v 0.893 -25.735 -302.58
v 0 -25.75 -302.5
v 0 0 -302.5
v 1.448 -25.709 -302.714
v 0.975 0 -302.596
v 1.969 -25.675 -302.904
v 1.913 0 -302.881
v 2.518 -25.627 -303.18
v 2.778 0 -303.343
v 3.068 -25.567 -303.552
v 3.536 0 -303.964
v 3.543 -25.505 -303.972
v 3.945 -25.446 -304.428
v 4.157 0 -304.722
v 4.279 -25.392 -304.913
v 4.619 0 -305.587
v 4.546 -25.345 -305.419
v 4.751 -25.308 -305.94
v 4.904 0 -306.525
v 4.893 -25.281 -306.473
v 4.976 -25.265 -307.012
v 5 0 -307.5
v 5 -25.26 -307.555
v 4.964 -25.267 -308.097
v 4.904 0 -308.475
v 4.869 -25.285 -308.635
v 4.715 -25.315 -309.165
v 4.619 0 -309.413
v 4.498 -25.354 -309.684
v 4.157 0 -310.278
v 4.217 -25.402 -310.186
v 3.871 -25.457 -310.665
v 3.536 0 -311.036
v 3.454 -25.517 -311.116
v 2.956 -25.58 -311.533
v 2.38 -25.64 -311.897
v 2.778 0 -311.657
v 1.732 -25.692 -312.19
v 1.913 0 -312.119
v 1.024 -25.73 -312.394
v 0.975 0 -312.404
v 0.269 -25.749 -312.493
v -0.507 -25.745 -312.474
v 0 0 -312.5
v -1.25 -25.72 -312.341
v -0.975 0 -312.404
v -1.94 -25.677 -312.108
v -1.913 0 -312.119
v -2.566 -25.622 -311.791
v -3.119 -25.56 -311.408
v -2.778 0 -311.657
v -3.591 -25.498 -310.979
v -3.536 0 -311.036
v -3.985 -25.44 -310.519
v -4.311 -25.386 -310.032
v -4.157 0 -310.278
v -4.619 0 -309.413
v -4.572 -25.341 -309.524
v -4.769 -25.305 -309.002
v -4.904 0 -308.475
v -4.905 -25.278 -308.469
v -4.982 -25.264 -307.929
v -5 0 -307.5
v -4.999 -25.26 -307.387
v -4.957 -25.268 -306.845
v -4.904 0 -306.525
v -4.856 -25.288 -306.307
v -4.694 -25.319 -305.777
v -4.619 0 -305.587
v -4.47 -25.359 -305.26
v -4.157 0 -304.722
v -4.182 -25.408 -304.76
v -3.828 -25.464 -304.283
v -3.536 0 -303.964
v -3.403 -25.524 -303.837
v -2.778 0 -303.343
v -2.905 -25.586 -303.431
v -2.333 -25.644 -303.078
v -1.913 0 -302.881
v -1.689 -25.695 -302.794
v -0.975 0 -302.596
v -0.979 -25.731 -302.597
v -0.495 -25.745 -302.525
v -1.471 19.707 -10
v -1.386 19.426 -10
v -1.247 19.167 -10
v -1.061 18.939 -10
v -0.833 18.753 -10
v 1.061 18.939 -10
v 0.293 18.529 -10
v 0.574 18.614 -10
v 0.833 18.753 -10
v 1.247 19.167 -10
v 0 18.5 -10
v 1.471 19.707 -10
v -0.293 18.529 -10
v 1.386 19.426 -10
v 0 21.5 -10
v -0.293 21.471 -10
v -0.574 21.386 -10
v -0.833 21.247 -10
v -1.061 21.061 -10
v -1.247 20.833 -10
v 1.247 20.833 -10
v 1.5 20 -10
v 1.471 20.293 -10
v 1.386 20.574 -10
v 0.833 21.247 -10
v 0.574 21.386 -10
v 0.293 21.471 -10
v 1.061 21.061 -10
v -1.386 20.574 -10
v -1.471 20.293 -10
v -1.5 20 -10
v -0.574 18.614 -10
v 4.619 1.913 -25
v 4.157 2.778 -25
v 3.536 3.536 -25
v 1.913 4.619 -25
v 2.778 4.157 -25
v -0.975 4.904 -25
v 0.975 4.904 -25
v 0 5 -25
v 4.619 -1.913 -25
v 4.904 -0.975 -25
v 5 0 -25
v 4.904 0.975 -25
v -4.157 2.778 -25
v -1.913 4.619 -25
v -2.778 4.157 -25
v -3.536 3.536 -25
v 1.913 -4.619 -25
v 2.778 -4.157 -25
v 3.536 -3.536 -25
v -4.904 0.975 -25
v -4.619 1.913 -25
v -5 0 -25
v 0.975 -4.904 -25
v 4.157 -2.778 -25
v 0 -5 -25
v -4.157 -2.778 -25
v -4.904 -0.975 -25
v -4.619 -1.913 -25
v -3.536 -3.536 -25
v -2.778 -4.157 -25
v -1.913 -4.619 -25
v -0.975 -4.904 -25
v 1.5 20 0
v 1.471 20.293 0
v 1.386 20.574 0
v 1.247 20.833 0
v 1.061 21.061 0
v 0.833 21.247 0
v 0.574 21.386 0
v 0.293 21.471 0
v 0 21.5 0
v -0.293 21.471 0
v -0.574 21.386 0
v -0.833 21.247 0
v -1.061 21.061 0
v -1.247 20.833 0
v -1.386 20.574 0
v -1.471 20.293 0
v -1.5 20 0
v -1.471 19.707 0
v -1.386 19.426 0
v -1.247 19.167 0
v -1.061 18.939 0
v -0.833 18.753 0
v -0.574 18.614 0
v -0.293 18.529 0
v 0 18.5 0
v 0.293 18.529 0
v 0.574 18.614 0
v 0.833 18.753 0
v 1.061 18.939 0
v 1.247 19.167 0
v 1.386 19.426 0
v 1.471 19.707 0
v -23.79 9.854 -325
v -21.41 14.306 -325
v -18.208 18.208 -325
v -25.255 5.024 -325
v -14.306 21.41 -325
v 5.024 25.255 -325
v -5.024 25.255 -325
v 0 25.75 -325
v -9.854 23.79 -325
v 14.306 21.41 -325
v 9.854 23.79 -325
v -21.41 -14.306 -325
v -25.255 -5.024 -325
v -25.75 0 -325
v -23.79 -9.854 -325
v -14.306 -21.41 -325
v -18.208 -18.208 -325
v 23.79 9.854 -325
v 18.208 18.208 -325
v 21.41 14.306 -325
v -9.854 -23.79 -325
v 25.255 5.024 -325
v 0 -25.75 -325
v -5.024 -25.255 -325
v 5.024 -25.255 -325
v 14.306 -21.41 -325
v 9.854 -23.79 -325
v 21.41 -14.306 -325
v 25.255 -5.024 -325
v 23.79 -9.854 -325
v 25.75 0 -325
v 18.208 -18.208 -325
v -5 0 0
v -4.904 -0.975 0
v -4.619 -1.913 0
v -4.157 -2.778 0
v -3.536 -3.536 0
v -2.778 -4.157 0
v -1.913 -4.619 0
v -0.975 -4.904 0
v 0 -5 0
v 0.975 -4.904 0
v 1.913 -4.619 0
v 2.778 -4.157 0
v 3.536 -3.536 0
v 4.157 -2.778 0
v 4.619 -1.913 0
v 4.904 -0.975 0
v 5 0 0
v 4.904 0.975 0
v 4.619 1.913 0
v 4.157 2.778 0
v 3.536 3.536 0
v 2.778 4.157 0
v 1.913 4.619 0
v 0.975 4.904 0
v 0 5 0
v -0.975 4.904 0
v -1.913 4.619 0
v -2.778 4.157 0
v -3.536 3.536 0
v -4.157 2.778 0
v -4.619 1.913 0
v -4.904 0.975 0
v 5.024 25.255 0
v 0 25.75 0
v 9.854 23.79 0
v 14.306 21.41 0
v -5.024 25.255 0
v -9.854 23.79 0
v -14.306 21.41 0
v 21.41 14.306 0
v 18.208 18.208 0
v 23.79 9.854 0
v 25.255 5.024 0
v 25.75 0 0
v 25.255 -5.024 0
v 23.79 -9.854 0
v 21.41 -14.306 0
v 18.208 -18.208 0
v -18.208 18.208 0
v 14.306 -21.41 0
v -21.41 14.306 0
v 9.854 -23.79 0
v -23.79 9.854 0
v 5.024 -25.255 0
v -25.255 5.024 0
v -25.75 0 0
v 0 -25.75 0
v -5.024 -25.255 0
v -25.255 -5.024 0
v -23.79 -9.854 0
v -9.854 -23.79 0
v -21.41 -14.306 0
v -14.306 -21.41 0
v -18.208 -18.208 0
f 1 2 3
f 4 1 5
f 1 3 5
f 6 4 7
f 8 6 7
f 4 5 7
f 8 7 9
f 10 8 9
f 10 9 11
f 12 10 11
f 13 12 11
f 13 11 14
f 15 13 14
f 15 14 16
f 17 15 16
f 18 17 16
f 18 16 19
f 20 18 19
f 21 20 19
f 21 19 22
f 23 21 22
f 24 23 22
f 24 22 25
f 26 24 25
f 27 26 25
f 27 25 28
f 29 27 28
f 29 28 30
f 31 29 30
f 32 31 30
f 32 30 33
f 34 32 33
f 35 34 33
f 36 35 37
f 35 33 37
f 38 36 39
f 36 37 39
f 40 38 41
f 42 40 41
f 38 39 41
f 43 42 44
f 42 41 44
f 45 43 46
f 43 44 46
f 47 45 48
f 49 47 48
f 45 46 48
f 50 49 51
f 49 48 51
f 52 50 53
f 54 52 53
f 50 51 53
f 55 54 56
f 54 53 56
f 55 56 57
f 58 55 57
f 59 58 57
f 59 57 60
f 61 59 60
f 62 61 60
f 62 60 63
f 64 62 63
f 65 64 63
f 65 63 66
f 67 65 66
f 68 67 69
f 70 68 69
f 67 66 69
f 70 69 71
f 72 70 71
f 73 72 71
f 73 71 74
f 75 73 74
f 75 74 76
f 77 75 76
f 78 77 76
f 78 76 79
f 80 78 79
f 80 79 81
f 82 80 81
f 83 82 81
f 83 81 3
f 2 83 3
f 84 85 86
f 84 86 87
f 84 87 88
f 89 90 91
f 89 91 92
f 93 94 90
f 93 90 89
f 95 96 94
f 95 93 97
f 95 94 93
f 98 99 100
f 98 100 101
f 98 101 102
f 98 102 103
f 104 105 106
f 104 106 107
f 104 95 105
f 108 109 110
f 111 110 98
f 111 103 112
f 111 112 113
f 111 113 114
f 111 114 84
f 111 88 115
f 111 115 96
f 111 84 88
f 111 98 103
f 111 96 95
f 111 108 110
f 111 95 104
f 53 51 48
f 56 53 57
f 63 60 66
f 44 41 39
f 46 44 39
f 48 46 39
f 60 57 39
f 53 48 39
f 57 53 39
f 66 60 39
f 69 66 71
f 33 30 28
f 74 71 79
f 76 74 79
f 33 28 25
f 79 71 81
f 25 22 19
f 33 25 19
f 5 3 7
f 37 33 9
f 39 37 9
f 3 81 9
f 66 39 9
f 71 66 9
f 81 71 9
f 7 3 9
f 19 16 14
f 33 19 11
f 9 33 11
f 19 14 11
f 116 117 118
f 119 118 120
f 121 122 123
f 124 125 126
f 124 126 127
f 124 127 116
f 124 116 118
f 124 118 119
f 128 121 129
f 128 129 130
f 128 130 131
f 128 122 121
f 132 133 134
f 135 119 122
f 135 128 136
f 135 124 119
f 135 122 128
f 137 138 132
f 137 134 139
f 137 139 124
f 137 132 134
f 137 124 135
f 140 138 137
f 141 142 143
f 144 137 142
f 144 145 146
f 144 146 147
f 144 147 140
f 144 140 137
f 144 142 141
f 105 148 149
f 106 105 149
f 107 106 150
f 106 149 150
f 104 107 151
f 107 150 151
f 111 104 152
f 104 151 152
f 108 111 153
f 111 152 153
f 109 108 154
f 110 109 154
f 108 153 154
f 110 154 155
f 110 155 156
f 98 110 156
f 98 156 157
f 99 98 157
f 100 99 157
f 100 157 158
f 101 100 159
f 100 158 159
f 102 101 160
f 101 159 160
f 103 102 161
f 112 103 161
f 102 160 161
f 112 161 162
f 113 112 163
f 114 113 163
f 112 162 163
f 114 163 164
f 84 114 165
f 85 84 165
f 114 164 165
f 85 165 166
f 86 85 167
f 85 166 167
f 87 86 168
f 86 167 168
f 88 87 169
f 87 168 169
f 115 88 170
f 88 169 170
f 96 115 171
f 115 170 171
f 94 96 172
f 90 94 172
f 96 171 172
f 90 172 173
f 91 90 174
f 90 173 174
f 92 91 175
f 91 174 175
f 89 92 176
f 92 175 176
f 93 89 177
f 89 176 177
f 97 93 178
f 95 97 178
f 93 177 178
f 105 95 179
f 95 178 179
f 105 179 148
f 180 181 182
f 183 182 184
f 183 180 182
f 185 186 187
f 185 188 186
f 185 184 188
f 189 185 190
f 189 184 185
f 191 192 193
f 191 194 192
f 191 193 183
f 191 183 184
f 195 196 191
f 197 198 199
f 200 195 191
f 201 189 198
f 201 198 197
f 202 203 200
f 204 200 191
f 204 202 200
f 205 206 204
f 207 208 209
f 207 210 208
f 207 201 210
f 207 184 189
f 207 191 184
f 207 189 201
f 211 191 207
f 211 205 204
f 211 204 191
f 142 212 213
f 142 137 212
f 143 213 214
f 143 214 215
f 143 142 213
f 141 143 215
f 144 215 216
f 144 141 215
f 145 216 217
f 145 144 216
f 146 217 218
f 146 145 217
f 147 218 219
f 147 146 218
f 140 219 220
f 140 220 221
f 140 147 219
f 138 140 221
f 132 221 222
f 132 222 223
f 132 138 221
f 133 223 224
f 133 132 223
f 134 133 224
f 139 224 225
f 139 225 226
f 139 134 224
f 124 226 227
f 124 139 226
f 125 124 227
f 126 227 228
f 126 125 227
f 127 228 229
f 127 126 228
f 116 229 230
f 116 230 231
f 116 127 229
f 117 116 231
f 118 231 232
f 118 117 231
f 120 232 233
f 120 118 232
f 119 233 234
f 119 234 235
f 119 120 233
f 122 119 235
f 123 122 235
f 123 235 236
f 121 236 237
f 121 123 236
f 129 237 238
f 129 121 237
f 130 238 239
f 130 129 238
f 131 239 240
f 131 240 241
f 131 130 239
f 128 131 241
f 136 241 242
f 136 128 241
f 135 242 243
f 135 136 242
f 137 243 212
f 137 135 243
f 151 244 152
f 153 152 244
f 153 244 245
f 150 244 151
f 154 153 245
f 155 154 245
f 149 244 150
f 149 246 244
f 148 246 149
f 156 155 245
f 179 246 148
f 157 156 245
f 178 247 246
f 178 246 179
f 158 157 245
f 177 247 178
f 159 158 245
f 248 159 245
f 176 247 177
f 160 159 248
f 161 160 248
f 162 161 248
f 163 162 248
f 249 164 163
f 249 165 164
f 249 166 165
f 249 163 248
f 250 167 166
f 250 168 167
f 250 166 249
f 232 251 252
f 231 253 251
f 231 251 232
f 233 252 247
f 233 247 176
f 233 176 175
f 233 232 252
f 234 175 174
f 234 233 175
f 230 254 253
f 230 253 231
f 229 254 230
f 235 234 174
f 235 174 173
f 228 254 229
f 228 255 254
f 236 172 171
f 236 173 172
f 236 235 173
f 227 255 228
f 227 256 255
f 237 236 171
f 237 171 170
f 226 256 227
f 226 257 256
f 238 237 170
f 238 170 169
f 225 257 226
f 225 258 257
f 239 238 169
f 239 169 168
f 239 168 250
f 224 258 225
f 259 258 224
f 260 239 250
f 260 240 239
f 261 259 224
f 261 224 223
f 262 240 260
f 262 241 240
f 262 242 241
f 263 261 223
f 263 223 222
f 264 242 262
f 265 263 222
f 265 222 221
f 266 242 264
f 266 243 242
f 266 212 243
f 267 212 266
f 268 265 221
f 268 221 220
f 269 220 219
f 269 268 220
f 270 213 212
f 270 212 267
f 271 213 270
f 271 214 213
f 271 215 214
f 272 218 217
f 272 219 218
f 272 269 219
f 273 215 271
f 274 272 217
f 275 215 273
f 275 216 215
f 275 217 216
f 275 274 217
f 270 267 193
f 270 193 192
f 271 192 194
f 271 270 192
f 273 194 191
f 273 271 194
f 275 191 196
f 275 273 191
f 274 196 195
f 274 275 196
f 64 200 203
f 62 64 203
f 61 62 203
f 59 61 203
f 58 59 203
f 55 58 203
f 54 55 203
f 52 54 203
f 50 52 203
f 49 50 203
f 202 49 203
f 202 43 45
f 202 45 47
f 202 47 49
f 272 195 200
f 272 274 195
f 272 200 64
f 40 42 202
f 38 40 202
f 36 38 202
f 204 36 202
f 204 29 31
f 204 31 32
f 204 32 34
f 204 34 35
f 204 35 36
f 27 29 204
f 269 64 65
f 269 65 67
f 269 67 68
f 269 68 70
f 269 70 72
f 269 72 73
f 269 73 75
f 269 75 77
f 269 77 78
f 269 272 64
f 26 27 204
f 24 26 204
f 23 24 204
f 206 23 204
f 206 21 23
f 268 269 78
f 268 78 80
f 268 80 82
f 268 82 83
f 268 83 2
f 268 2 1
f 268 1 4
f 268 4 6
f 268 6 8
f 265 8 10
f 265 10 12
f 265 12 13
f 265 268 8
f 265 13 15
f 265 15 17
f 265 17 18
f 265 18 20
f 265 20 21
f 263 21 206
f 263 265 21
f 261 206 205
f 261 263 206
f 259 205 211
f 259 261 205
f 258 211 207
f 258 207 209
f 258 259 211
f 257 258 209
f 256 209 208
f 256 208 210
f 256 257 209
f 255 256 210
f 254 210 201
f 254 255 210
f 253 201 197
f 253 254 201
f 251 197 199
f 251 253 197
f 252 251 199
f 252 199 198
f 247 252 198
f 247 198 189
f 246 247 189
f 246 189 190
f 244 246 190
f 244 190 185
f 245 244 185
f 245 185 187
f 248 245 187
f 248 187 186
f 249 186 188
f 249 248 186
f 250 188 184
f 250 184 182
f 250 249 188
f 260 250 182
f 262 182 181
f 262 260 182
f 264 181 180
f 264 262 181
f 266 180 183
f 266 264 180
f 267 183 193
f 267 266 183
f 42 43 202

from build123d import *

# Parameters (mm, degrees)
SKETCH2_R          = 5
CUT_EXTRUDE1_DEPTH = 328.033828525
SKETCH3_R          = 1.5
CUT_EXTRUDE2_DEPTH = 10


with BuildPart() as part:
    # Sketch1 → Revolve1 (revolve)
    with BuildSketch(Plane(origin=(0, 0, 0), x_dir=(1, 0, 0), z_dir=(0, 1, 0))):
        Polygon((0, 325), (-25.75, 325), (-25.75, 0), (-5, 0), (-5, 25), (0, 25), align=None)
    revolve(axis=Axis((0, 0, -14.83423913), (0, 0, 1)))

    # Sketch2 → Cut-Extrude1 (cut, through all)
    with BuildSketch(Plane(origin=(0, 0, 0), x_dir=(1, 0, 0), z_dir=(0, 1, 0))):
        with Locations(Location((0, 307.5, 0), (0, 0, 270))):
            Circle(SKETCH2_R)
    extrude(amount=-CUT_EXTRUDE1_DEPTH, mode=Mode.SUBTRACT)

    # Sketch3 → Cut-Extrude2 (cut)
    with BuildSketch(Plane.XY):
        with Locations((0, 20)):
            Circle(SKETCH3_R)
    extrude(amount=-CUT_EXTRUDE2_DEPTH, mode=Mode.SUBTRACT)


solid = part.part
